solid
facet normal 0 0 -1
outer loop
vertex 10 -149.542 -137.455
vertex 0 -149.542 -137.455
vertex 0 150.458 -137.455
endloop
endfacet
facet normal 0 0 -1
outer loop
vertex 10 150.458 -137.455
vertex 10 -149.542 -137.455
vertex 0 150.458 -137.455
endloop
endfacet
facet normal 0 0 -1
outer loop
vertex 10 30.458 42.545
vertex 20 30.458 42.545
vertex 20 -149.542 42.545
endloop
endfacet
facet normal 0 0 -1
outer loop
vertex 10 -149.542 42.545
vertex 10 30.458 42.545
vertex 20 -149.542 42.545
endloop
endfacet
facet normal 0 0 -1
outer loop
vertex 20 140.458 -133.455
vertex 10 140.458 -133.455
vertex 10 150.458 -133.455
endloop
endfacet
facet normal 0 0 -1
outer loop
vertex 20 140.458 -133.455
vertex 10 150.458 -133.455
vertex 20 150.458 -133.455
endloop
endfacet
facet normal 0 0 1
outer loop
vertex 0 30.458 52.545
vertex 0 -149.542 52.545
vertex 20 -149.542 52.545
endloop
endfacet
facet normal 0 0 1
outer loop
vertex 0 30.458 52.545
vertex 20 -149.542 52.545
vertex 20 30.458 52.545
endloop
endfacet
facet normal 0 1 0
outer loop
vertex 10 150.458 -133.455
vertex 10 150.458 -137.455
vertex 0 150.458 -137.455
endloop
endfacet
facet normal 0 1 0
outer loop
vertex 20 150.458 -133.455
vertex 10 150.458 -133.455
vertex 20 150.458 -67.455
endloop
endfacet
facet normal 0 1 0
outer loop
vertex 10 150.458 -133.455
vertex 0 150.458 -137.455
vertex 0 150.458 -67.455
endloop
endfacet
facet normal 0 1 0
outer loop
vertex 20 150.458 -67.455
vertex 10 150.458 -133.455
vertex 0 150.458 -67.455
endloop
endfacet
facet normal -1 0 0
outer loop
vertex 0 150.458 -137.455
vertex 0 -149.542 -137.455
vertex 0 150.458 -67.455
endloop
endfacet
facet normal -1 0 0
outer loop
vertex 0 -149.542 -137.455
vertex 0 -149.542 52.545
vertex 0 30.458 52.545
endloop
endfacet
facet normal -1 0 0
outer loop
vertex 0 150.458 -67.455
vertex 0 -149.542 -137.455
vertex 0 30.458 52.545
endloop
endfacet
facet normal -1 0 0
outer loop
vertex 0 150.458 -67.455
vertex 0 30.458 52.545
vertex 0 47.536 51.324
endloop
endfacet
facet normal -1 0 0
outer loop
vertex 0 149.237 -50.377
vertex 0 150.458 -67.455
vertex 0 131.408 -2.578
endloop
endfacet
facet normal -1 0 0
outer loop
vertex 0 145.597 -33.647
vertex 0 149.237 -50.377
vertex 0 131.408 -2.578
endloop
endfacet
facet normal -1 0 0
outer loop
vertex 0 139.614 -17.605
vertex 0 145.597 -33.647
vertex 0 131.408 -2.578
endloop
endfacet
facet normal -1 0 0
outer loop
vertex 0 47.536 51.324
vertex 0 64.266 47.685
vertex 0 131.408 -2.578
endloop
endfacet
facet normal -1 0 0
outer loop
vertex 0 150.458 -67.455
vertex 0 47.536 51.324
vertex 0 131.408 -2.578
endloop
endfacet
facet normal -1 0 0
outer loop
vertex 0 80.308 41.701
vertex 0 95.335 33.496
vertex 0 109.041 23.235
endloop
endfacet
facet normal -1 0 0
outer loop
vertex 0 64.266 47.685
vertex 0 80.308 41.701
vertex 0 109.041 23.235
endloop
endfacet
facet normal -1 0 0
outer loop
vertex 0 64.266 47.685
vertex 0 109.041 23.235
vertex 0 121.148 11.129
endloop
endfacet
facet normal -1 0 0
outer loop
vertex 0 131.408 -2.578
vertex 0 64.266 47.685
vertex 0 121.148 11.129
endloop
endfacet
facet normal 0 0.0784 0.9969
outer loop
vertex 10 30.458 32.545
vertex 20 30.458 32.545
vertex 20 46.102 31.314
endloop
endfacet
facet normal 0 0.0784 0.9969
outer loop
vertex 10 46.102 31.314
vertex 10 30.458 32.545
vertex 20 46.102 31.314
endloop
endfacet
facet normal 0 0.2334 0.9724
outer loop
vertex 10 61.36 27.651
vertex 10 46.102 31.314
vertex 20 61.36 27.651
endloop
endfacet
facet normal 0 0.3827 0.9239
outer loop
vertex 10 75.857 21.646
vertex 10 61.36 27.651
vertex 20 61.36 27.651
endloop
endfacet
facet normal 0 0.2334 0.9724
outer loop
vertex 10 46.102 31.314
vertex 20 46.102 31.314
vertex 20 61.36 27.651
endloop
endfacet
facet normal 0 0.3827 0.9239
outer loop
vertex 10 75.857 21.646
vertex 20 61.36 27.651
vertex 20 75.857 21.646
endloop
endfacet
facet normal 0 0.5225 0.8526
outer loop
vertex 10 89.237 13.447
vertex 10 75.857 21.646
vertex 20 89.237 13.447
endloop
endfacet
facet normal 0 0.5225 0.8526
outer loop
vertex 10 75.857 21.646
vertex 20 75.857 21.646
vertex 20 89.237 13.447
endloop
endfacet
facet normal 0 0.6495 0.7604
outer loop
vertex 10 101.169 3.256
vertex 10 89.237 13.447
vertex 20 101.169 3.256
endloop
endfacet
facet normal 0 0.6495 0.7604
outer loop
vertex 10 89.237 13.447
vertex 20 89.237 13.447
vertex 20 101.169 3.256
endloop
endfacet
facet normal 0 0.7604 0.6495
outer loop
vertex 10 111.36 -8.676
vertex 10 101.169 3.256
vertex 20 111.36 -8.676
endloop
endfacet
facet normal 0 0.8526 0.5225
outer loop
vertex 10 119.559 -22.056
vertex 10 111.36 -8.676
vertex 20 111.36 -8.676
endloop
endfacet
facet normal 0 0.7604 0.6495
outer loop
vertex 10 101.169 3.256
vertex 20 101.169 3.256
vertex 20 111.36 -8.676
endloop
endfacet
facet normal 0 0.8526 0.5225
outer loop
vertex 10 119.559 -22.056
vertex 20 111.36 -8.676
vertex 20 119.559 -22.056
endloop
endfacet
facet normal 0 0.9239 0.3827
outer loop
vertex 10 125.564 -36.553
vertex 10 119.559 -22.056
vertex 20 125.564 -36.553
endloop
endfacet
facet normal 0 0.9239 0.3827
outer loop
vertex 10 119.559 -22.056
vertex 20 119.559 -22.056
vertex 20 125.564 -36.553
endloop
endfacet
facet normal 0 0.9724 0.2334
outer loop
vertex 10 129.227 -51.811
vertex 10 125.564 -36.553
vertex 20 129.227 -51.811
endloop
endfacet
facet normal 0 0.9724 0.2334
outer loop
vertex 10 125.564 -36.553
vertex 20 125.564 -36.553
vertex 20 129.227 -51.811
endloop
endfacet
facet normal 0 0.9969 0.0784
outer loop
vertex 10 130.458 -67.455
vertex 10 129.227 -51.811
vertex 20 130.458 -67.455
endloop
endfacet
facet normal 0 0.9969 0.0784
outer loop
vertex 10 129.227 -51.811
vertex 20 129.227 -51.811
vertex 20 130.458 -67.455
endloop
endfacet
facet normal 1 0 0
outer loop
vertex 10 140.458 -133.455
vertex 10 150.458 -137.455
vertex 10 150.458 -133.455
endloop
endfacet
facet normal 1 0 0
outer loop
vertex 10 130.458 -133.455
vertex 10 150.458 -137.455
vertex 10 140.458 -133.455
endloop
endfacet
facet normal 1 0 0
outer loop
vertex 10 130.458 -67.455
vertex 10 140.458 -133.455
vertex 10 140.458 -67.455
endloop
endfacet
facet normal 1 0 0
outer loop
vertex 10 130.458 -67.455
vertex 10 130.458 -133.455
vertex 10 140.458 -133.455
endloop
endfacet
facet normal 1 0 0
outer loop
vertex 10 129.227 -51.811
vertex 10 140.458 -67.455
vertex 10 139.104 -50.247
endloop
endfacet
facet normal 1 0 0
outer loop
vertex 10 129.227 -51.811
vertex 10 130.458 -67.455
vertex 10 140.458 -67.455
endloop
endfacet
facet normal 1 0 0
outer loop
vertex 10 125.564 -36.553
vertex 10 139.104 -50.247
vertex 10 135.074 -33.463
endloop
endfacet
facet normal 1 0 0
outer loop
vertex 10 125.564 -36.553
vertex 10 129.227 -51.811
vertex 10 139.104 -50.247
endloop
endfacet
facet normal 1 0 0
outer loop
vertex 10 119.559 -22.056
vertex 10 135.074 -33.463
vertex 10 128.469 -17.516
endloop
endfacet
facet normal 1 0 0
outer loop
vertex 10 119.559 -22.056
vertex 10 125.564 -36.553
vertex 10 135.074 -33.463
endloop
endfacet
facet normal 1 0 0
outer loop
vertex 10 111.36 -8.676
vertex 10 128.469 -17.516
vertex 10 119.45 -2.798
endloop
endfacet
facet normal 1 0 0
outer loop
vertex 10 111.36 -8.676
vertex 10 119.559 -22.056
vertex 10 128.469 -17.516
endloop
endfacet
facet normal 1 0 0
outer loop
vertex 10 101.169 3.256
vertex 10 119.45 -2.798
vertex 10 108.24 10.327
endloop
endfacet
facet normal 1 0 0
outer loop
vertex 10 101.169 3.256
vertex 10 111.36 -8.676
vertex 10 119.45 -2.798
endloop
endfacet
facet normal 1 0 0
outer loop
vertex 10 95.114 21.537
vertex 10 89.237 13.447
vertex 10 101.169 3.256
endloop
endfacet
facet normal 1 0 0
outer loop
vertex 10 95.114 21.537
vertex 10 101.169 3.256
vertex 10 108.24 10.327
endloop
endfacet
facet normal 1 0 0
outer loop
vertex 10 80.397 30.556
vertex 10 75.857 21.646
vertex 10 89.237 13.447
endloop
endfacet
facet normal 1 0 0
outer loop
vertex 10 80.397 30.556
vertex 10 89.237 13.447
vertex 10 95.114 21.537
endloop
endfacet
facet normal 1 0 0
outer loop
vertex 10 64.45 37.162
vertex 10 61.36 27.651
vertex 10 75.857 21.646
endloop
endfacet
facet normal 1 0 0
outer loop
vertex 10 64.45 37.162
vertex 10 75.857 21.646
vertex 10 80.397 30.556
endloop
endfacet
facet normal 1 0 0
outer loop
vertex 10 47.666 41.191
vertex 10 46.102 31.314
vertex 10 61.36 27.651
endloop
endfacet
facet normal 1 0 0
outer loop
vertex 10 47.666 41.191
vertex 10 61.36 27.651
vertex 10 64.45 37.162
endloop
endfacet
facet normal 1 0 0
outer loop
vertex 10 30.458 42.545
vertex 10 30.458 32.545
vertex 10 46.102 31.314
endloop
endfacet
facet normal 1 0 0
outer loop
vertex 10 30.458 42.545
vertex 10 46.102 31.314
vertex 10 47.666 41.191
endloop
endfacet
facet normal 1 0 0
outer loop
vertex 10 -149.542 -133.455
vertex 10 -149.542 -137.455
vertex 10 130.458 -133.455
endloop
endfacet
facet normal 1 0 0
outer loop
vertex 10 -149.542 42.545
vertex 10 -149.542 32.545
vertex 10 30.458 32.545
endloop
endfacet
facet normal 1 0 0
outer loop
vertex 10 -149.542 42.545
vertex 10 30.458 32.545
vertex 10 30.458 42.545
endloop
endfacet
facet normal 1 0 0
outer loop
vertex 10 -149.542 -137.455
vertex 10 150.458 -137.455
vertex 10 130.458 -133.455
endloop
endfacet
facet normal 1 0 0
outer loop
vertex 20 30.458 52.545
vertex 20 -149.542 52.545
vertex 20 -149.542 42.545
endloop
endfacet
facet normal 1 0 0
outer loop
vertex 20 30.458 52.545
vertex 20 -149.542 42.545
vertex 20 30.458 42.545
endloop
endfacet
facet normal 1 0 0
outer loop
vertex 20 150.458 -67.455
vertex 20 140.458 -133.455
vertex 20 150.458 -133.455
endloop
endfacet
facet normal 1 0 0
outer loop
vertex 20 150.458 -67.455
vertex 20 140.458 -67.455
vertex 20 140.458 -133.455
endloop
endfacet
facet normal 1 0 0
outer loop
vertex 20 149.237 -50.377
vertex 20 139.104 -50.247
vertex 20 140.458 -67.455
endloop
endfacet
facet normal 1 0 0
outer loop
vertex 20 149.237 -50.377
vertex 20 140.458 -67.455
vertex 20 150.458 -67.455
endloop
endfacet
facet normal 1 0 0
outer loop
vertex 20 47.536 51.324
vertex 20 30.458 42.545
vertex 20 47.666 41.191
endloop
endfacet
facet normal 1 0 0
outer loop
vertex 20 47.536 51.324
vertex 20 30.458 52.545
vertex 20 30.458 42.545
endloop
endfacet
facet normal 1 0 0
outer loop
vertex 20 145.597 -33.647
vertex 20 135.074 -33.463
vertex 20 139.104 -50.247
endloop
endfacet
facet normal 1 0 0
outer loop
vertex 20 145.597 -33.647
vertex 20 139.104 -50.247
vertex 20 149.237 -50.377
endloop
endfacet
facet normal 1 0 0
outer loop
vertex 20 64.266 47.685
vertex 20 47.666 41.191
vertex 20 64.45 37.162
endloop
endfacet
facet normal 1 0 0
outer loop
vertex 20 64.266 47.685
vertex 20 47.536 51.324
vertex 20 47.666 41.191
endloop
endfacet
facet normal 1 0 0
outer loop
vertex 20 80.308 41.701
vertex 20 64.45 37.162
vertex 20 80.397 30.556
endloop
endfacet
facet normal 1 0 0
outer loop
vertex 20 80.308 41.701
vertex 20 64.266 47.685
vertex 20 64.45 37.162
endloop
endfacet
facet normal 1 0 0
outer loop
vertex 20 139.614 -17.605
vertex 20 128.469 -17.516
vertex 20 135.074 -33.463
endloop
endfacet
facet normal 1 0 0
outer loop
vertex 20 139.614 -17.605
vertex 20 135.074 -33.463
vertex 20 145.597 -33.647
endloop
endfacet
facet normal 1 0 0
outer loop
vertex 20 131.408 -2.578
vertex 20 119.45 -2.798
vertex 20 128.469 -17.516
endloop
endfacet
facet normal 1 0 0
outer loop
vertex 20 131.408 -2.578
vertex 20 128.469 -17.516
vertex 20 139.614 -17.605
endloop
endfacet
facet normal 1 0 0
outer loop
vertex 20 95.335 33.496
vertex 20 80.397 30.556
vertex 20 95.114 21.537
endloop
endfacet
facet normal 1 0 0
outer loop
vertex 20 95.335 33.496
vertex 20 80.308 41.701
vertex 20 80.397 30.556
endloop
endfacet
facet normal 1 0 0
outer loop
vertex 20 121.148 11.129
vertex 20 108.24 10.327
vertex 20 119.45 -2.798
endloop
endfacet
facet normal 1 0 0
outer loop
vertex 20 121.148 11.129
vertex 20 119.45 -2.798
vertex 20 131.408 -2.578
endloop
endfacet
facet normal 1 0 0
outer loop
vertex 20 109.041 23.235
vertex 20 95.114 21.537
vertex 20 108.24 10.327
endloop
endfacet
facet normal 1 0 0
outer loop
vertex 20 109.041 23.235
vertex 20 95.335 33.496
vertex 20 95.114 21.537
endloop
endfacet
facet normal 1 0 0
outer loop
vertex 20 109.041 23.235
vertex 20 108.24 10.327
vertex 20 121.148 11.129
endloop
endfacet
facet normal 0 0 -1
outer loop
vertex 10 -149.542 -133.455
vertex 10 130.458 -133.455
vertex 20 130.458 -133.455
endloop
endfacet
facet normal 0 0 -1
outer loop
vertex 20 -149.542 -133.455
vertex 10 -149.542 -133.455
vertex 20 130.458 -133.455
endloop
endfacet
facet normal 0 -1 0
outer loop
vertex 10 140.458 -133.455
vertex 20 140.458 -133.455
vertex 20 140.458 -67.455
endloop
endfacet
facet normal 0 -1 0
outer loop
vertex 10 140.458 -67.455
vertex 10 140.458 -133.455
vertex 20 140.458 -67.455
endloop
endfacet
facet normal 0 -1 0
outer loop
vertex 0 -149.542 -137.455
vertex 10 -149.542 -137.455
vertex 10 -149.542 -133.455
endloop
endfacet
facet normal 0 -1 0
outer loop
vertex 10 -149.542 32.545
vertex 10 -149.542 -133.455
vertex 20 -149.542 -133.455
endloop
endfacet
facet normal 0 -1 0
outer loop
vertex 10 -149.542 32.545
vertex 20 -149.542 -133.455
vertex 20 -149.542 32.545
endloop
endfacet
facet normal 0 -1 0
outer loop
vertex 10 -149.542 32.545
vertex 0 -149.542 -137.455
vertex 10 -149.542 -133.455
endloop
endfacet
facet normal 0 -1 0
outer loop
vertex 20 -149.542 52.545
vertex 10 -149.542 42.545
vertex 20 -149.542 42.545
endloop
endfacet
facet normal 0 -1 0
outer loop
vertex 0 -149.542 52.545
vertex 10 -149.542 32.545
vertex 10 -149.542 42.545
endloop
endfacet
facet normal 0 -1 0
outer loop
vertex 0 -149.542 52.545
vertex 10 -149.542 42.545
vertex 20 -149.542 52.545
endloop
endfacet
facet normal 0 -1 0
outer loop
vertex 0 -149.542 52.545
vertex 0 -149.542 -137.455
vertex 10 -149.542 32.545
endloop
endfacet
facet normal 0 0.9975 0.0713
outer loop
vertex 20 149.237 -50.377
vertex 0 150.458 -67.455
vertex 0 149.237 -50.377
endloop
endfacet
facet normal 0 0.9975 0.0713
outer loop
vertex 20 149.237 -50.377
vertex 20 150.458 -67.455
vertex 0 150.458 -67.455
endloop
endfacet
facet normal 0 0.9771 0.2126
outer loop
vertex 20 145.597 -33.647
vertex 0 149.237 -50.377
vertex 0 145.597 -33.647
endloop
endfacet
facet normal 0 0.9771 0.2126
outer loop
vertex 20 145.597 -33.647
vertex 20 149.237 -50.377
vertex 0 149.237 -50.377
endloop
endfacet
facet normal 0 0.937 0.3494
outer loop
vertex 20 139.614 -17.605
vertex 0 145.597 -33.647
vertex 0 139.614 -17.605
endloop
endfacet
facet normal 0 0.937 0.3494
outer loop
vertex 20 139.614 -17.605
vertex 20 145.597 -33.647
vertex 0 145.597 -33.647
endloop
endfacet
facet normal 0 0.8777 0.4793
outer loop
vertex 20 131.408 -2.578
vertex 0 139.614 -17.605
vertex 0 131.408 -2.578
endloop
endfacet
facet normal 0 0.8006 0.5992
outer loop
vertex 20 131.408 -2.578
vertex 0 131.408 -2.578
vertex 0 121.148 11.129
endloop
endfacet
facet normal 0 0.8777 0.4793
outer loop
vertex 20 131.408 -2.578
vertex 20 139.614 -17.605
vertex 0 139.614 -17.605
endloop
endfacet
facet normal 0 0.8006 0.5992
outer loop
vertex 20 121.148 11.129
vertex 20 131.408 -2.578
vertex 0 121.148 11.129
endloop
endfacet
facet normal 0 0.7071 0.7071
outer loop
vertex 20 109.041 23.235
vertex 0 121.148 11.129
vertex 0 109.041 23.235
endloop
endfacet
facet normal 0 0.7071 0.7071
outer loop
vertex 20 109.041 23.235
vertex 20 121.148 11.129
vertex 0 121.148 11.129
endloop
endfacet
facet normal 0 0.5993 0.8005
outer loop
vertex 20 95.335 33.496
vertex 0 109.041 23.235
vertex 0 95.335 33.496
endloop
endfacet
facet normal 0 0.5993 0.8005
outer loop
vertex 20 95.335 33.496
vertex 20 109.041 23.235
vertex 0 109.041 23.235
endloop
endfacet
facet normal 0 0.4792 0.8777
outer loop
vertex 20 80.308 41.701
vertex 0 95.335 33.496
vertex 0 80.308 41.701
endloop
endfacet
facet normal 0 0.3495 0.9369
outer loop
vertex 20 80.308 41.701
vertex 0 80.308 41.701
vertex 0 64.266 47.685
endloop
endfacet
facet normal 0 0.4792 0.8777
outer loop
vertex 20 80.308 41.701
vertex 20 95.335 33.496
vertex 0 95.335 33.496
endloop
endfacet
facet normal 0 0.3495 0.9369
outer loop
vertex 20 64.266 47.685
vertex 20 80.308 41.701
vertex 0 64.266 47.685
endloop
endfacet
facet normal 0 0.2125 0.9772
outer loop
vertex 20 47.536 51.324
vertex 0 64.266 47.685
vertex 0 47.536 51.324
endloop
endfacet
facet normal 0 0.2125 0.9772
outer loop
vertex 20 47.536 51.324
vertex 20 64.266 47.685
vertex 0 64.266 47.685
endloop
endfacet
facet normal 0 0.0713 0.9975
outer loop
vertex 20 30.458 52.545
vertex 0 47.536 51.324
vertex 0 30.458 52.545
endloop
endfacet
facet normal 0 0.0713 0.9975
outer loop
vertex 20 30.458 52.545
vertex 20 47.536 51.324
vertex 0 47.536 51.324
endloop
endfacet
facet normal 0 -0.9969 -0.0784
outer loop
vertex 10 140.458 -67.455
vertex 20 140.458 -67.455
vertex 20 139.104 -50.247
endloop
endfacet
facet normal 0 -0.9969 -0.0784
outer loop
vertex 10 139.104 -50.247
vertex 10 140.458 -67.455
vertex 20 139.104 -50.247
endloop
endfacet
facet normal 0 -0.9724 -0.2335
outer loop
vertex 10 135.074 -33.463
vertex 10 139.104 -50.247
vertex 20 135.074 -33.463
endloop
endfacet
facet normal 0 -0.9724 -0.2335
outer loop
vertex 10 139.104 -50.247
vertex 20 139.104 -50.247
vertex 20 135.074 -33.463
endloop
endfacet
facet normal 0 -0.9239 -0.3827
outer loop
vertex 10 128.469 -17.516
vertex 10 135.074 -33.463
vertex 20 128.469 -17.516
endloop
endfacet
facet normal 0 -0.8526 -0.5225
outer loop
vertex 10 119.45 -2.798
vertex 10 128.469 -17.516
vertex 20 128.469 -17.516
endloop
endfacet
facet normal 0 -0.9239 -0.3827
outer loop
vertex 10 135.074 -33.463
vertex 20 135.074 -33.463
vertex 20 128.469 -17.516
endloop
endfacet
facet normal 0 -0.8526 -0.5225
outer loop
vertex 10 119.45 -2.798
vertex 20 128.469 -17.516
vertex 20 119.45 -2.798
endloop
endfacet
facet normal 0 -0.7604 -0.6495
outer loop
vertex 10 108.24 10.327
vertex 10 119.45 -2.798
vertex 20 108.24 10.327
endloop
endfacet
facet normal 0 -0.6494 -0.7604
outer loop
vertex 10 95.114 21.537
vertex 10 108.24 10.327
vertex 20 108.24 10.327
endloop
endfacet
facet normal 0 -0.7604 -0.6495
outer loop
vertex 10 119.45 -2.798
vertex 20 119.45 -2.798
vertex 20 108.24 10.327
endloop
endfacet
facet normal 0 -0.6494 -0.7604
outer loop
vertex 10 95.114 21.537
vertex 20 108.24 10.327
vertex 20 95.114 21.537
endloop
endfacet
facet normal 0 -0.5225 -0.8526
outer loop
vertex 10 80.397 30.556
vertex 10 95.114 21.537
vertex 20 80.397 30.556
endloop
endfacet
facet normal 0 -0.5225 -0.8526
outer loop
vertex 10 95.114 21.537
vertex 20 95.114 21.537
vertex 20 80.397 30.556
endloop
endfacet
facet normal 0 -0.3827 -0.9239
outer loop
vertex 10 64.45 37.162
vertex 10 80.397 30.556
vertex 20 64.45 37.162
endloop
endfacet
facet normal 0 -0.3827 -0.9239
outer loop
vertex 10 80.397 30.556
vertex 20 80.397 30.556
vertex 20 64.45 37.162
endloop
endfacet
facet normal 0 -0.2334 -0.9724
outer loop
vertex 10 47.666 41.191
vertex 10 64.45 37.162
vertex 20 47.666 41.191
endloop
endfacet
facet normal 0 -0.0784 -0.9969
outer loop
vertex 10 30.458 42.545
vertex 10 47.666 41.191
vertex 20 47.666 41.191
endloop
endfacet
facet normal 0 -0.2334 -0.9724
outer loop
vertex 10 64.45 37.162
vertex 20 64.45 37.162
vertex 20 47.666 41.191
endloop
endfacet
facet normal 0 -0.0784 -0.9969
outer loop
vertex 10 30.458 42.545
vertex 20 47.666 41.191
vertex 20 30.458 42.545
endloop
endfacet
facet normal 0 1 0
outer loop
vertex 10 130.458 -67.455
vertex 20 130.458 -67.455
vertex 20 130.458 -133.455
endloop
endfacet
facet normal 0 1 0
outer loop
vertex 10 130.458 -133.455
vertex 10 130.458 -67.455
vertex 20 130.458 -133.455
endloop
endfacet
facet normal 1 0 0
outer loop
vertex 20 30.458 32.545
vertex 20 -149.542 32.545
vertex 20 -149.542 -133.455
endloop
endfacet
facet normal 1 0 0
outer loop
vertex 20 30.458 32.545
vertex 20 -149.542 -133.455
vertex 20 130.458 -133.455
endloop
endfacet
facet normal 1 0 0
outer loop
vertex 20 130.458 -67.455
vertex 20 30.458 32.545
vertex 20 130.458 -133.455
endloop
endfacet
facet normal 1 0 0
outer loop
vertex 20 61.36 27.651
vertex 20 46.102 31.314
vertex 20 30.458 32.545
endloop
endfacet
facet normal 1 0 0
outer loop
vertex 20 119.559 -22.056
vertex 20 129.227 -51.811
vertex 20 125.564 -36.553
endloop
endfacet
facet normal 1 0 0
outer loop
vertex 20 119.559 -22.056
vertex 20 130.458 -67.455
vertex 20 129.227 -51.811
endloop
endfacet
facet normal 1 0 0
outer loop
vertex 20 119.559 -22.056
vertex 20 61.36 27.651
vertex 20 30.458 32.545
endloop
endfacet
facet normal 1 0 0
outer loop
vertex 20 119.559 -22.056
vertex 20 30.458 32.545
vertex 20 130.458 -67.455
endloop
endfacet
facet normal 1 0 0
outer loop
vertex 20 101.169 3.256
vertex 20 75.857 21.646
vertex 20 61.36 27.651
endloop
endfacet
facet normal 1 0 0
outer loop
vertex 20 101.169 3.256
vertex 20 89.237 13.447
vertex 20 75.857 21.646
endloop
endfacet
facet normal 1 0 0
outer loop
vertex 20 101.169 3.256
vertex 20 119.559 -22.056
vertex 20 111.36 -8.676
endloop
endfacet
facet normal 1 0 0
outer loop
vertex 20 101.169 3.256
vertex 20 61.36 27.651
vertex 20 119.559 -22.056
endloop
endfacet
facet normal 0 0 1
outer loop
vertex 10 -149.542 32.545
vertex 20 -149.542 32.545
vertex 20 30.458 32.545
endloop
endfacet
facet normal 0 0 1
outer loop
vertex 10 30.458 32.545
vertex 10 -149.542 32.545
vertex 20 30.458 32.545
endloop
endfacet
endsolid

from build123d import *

# Parameters (mm, degrees)
F0_W     = 300
F0_H     = 190
F1_DEPTH = 20
F2_R     = 120
F4_DEPTH = 10
F5_W     = 10
F5_H     = 4
F6_DEPTH = 312


with BuildPart() as f1:
    # F0 (on Right) → F1 (new body)
    with BuildSketch(Plane.YZ):
        with Locations((0.458071, -42.454607)):
            Rectangle(F0_W, F0_H)
    extrude(amount=F1_DEPTH)

    # F2
    f2_edges = [f1.edges().sort_by_distance(p)[0] for p in [
        (10, 150.458071, 52.545393),
    ]]
    fillet(f2_edges, radius=F2_R)

    # F3 (on face) → F4 (cut)
    with BuildSketch(Plane.YZ.offset(20)):
        with BuildLine():
            Line((30.458071, 42.545393), (-149.541929, 42.545393))
            Line((-149.541929, 42.545393), (-149.541929, 32.545393))
            Line((-149.541929, 32.545393), (30.458071, 32.545393))
            ThreePointArc((30.458071, 32.545393), (101.168749, 3.256071), (130.458071, -67.454607))
            Line((130.458071, -67.454607), (130.458071, -137.454607))
            Line((130.458071, -137.454607), (140.458071, -137.454607))
            Line((140.458071, -137.454607), (140.458071, -67.454607))
            ThreePointArc((140.458071, -67.454607), (108.239817, 10.327139), (30.458071, 42.545393))
        make_face()
    extrude(amount=-F4_DEPTH, mode=Mode.SUBTRACT)

    # F5 (on face) → F6 (cut)
    with BuildSketch(Plane.XZ.offset(149.541929)):
        with Locations((15, -135.454607)):
            Rectangle(F5_W, F5_H)
    extrude(amount=-F6_DEPTH, mode=Mode.SUBTRACT)


solid = f1.part
